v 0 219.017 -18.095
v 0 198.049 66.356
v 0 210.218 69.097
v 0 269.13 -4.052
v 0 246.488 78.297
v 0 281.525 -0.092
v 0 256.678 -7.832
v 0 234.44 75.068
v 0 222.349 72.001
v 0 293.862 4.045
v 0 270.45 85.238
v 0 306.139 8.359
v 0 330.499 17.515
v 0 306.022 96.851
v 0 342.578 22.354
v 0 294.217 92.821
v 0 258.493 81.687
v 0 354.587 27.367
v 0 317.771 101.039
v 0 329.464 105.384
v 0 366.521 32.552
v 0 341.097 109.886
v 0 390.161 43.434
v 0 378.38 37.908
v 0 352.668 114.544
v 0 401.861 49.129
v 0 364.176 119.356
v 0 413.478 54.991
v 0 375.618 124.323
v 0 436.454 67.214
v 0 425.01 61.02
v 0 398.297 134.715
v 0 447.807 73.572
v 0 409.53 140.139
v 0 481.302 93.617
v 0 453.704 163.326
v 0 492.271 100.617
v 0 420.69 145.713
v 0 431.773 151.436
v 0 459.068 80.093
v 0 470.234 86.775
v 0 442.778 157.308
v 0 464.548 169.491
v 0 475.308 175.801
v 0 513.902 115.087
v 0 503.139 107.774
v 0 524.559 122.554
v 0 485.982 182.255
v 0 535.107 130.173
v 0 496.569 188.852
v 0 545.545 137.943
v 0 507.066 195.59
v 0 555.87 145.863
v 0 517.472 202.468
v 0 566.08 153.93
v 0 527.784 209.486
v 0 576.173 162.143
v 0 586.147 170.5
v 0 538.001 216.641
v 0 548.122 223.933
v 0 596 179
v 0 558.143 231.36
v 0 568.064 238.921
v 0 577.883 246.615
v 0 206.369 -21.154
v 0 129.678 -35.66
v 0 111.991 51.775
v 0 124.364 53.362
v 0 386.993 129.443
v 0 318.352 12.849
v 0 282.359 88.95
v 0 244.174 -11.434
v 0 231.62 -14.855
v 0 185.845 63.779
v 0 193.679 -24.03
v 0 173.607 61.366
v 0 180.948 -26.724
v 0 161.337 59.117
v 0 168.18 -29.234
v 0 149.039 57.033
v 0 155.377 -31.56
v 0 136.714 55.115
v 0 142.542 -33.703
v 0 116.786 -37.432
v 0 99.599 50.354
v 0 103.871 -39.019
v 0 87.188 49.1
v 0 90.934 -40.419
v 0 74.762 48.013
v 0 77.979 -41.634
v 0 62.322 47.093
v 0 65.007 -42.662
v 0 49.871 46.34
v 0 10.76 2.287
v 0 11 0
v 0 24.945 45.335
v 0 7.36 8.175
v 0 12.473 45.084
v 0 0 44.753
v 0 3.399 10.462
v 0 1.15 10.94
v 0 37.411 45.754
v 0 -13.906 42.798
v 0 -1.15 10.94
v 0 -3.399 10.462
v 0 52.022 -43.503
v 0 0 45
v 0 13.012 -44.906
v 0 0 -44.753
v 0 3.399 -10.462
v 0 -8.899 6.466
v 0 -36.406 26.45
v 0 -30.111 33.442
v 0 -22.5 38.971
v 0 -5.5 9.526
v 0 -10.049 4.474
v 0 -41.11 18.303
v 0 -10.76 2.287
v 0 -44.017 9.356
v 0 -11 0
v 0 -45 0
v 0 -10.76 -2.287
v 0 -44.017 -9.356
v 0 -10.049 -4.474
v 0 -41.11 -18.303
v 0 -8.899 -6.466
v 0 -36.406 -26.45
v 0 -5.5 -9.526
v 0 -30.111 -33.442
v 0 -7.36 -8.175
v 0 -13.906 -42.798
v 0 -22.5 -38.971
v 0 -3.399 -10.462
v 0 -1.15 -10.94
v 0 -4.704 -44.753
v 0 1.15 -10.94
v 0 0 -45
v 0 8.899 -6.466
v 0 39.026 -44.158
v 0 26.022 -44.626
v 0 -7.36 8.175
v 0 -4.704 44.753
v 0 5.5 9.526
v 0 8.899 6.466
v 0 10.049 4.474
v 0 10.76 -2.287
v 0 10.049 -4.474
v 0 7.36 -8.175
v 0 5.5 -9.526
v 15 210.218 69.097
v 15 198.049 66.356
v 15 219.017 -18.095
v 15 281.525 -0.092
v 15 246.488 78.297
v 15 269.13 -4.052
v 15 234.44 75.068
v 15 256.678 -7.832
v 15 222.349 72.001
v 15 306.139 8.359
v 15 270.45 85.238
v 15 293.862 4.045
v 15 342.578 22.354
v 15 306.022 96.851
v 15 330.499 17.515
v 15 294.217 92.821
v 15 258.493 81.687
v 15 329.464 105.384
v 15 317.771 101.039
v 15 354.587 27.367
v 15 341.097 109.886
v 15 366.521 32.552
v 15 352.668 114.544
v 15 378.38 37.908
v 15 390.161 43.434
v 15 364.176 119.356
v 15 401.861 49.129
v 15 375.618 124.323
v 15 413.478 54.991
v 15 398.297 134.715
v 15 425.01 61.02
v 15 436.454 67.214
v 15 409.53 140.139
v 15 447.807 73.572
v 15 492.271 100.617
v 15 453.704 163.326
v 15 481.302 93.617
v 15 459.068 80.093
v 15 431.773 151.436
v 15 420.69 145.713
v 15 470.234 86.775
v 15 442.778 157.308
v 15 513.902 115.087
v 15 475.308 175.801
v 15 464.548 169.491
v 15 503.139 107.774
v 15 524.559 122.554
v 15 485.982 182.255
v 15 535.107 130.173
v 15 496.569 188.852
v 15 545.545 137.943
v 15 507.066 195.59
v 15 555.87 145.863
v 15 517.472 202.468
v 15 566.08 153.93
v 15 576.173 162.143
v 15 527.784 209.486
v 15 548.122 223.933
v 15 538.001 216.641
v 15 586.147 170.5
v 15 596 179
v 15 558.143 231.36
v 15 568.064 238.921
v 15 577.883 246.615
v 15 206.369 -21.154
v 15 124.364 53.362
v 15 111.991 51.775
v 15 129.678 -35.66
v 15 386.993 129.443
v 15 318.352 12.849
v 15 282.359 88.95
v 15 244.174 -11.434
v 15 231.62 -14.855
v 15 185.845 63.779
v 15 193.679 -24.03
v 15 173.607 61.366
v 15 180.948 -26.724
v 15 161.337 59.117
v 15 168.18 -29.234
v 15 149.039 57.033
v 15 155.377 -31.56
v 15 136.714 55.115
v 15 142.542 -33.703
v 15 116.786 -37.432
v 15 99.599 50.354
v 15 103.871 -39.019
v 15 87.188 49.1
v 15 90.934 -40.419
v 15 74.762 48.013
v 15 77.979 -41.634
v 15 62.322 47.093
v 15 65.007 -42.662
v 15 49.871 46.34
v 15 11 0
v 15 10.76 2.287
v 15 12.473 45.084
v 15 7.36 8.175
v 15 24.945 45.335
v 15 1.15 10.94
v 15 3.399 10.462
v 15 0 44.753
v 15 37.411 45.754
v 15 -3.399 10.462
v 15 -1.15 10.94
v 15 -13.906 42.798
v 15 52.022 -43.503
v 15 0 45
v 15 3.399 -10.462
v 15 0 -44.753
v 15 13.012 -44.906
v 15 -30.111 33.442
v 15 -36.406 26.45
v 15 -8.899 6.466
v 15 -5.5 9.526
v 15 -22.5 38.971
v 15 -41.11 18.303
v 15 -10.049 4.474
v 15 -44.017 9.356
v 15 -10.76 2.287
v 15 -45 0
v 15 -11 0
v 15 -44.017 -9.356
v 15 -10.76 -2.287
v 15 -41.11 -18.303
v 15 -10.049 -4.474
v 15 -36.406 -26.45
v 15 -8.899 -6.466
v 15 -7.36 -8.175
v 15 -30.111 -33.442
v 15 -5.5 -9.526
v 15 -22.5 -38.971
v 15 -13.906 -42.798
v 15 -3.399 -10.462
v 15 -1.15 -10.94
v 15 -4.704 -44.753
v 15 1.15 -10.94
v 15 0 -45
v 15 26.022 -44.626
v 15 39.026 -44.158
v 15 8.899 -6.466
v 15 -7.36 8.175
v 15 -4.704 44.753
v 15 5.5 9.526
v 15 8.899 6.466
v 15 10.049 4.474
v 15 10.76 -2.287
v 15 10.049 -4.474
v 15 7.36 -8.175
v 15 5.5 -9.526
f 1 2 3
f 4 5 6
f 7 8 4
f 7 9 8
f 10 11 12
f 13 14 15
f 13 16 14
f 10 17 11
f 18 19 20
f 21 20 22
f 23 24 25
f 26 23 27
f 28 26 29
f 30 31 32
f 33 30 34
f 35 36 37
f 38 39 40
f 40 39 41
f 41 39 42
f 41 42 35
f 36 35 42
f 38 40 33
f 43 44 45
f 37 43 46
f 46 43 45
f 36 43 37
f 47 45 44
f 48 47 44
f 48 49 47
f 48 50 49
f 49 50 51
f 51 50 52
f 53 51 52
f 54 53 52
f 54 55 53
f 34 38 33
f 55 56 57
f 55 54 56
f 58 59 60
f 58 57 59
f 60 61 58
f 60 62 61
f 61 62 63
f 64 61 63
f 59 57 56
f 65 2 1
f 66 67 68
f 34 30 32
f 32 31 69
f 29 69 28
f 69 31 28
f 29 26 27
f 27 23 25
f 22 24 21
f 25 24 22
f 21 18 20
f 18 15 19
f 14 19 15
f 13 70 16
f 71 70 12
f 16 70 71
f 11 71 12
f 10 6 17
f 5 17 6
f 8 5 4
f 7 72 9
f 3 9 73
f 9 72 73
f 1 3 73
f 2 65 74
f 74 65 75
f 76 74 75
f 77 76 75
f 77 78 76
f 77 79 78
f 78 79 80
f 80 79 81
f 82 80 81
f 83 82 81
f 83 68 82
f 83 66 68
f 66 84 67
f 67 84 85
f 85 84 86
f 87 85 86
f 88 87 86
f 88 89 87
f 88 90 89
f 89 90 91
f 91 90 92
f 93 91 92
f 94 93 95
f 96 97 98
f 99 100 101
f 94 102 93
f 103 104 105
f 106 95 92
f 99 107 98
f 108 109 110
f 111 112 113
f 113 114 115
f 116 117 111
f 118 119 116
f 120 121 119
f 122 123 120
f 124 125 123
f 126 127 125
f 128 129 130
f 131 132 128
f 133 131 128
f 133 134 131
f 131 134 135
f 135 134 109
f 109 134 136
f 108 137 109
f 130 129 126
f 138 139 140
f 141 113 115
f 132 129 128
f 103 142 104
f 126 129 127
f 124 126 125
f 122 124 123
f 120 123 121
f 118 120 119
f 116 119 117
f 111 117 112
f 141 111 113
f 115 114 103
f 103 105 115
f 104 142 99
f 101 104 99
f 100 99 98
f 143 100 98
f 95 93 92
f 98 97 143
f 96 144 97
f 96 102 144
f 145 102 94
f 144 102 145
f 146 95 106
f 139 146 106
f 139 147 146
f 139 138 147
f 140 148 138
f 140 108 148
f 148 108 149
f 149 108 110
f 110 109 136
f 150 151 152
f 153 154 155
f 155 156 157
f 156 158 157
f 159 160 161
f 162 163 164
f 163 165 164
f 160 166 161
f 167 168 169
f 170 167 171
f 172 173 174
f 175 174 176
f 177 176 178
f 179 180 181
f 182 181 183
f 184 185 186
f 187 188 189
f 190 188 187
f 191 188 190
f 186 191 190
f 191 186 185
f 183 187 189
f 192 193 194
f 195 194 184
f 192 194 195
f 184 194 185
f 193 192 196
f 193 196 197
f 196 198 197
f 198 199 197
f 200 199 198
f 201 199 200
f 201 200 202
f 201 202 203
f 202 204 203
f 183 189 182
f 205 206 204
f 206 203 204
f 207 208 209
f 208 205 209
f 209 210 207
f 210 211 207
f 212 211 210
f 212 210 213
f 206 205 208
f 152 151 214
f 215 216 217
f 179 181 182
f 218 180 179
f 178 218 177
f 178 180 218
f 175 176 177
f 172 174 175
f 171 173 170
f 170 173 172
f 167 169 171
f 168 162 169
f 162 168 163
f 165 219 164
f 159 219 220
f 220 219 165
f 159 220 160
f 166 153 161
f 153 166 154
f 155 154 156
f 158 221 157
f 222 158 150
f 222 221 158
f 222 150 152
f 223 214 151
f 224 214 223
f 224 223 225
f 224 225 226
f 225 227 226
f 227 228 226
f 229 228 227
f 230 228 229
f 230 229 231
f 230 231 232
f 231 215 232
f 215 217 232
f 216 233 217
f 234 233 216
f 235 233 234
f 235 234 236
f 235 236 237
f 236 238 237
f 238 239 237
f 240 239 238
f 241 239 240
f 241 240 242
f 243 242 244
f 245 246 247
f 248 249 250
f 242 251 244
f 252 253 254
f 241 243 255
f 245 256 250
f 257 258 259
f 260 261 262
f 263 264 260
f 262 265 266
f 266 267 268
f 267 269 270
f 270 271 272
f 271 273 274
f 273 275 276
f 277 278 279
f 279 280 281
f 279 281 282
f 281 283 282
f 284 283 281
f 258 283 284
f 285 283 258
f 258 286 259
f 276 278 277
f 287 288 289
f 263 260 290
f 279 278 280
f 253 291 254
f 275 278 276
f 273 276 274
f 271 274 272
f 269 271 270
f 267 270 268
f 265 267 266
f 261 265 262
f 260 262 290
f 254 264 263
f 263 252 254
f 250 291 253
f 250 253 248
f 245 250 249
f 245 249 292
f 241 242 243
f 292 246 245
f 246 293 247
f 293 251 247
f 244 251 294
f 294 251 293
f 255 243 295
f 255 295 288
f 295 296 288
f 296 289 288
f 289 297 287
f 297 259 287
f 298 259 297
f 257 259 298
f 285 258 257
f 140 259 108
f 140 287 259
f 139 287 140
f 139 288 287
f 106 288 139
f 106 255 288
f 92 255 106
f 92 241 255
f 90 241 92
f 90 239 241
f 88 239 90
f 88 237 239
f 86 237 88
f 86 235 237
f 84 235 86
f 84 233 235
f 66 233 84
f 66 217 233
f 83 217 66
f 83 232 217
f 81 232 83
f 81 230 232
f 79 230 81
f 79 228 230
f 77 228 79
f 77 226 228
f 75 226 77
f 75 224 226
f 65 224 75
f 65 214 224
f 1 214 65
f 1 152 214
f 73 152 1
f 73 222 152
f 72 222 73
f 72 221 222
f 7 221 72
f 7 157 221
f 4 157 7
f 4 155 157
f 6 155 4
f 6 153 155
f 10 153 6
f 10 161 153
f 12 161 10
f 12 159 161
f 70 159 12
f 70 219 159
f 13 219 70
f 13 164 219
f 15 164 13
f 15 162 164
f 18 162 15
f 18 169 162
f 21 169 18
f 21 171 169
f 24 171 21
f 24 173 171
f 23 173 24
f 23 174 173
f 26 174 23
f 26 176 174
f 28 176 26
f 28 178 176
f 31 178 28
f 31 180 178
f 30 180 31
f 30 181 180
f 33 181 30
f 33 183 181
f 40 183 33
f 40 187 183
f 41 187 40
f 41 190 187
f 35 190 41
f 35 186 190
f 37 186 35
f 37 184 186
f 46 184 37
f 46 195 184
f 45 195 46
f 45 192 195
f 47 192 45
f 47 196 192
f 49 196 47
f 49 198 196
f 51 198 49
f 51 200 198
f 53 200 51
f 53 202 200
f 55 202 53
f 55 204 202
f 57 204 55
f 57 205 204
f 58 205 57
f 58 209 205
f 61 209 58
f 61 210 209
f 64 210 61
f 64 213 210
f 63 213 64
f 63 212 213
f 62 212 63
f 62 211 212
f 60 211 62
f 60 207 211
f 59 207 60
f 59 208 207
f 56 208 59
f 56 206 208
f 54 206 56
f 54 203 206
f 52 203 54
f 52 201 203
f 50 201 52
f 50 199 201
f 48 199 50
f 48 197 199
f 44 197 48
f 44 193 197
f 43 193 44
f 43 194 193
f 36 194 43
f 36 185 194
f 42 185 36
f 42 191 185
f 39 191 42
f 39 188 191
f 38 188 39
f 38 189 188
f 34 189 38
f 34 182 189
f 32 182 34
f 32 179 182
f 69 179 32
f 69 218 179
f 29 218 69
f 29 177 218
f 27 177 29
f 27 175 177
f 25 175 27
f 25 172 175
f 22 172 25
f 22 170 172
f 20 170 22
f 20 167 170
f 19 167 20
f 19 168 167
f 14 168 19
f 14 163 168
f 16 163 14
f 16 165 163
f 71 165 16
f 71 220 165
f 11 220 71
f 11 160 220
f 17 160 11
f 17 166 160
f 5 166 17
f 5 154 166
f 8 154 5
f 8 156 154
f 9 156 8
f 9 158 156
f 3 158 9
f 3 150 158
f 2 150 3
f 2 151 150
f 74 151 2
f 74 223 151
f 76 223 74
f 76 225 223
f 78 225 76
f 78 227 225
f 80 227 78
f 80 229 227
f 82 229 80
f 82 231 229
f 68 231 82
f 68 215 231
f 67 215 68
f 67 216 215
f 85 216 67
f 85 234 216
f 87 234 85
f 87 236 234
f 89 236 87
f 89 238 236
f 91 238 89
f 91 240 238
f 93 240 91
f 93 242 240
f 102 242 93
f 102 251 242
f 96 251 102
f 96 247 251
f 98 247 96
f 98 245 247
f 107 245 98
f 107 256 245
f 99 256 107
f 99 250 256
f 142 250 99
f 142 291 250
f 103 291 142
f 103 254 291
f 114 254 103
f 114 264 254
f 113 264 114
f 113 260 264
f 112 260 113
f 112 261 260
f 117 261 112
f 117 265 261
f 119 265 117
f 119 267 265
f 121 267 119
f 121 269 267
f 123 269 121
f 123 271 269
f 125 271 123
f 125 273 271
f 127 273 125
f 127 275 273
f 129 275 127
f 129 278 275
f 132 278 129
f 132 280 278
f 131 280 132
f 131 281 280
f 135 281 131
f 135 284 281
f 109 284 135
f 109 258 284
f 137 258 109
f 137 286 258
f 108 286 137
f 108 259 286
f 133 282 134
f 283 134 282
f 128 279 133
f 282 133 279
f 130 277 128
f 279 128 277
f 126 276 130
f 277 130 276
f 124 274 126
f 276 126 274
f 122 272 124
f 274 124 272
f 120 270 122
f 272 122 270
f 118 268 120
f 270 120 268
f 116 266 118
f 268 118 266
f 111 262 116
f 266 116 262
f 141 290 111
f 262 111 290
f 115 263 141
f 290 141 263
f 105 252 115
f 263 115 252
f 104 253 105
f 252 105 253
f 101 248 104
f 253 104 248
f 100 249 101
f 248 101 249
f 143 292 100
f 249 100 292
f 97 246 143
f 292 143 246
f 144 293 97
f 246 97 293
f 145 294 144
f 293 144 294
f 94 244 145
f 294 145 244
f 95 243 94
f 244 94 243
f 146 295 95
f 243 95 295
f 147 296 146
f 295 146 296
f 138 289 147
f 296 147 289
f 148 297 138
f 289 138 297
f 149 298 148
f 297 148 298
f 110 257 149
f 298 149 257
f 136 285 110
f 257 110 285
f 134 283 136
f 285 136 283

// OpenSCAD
// file: utils.scad
module copy_mirror_y() {
    for(i=[0:1]) mirror(v= [i,0,0]) children();
};


module cut_cylinder(d,h,center=false,margin=0.1,bottom=1,top=1) {
    translate([0,0,-margin*bottom]) cylinder(d=d, h=h+(bottom+top)*margin,center=center);
}
// file: variables.scad
// frame
frame_length=596;
frame_height=179;
frame_spacing_axis = 120;
frame_spacing_front = 20;
frame_a = 90;
frame_b = 70;

steer_angle = 15;

// front fork and steer
front_wheel_y = 700;
fork_spacing = 100;
fork_width = 50;

wood_thickness = 15;


// dependent parameters
frame_angle = atan(((frame_spacing_axis-frame_spacing_front)/2)/frame_length);

frame_color = "White";
// main file
include <variables.scad>;
use <utils.scad>;

module two_arc_frame(a, b, steer_angle, outer_x, outer_y) {

    inner_offset_y = a;
    inner_x = outer_x - b*sin(steer_angle);
    inner_y = outer_y - inner_offset_y + b*cos(steer_angle);

    outer_r = outer_x*outer_x/(2*outer_y) + outer_y/2;
    outer_angle = asin(outer_x/outer_r);

    inner_r = inner_x*inner_x/(2*inner_y) + inner_y/2;
    inner_angle = asin(inner_x/inner_r);

    n = 50;

    points_outer_arc = [
        for(a = [0:1:n])
            [outer_r * cos(outer_angle*a/n-90),
             outer_r * sin(outer_angle*a/n-90) + outer_r]
    ];
    points_inner_arc = [
        for(a = [n:-1:0])
            [inner_r * cos(inner_angle*a/n-90),
             inner_r * sin(inner_angle*a/n-90) + inner_r + inner_offset_y]
    ];

        
    polygon(concat(points_outer_arc, points_inner_arc));
}



module frame_2d() {
    outer_x = frame_length;
    outer_y = frame_height;
    d_axis = 22;

    difference() {
        union() {
            translate([0,-frame_a/2])
                two_arc_frame(a=frame_a,b=frame_b,steer_angle=steer_angle,
                    outer_x=outer_x,outer_y=outer_y+frame_a/2);
            circle(d=frame_a);
        }
        circle(d=d_axis);
    }
}

module frame() {
    thickness=15;
    rotate([90,0,0]) rotate([0,90,0])
        linear_extrude(height=thickness) {
            frame_2d();
        }
}

frame();

//two_arc_frame();
//frame_2d();

//
//module frame() {
//    copy_mirror_y() {
//        translate([frame_spacing_axis/2,0,0])
//            rotate([0,0,frame_angle])
//                single_frame();
//    };
//}
//
